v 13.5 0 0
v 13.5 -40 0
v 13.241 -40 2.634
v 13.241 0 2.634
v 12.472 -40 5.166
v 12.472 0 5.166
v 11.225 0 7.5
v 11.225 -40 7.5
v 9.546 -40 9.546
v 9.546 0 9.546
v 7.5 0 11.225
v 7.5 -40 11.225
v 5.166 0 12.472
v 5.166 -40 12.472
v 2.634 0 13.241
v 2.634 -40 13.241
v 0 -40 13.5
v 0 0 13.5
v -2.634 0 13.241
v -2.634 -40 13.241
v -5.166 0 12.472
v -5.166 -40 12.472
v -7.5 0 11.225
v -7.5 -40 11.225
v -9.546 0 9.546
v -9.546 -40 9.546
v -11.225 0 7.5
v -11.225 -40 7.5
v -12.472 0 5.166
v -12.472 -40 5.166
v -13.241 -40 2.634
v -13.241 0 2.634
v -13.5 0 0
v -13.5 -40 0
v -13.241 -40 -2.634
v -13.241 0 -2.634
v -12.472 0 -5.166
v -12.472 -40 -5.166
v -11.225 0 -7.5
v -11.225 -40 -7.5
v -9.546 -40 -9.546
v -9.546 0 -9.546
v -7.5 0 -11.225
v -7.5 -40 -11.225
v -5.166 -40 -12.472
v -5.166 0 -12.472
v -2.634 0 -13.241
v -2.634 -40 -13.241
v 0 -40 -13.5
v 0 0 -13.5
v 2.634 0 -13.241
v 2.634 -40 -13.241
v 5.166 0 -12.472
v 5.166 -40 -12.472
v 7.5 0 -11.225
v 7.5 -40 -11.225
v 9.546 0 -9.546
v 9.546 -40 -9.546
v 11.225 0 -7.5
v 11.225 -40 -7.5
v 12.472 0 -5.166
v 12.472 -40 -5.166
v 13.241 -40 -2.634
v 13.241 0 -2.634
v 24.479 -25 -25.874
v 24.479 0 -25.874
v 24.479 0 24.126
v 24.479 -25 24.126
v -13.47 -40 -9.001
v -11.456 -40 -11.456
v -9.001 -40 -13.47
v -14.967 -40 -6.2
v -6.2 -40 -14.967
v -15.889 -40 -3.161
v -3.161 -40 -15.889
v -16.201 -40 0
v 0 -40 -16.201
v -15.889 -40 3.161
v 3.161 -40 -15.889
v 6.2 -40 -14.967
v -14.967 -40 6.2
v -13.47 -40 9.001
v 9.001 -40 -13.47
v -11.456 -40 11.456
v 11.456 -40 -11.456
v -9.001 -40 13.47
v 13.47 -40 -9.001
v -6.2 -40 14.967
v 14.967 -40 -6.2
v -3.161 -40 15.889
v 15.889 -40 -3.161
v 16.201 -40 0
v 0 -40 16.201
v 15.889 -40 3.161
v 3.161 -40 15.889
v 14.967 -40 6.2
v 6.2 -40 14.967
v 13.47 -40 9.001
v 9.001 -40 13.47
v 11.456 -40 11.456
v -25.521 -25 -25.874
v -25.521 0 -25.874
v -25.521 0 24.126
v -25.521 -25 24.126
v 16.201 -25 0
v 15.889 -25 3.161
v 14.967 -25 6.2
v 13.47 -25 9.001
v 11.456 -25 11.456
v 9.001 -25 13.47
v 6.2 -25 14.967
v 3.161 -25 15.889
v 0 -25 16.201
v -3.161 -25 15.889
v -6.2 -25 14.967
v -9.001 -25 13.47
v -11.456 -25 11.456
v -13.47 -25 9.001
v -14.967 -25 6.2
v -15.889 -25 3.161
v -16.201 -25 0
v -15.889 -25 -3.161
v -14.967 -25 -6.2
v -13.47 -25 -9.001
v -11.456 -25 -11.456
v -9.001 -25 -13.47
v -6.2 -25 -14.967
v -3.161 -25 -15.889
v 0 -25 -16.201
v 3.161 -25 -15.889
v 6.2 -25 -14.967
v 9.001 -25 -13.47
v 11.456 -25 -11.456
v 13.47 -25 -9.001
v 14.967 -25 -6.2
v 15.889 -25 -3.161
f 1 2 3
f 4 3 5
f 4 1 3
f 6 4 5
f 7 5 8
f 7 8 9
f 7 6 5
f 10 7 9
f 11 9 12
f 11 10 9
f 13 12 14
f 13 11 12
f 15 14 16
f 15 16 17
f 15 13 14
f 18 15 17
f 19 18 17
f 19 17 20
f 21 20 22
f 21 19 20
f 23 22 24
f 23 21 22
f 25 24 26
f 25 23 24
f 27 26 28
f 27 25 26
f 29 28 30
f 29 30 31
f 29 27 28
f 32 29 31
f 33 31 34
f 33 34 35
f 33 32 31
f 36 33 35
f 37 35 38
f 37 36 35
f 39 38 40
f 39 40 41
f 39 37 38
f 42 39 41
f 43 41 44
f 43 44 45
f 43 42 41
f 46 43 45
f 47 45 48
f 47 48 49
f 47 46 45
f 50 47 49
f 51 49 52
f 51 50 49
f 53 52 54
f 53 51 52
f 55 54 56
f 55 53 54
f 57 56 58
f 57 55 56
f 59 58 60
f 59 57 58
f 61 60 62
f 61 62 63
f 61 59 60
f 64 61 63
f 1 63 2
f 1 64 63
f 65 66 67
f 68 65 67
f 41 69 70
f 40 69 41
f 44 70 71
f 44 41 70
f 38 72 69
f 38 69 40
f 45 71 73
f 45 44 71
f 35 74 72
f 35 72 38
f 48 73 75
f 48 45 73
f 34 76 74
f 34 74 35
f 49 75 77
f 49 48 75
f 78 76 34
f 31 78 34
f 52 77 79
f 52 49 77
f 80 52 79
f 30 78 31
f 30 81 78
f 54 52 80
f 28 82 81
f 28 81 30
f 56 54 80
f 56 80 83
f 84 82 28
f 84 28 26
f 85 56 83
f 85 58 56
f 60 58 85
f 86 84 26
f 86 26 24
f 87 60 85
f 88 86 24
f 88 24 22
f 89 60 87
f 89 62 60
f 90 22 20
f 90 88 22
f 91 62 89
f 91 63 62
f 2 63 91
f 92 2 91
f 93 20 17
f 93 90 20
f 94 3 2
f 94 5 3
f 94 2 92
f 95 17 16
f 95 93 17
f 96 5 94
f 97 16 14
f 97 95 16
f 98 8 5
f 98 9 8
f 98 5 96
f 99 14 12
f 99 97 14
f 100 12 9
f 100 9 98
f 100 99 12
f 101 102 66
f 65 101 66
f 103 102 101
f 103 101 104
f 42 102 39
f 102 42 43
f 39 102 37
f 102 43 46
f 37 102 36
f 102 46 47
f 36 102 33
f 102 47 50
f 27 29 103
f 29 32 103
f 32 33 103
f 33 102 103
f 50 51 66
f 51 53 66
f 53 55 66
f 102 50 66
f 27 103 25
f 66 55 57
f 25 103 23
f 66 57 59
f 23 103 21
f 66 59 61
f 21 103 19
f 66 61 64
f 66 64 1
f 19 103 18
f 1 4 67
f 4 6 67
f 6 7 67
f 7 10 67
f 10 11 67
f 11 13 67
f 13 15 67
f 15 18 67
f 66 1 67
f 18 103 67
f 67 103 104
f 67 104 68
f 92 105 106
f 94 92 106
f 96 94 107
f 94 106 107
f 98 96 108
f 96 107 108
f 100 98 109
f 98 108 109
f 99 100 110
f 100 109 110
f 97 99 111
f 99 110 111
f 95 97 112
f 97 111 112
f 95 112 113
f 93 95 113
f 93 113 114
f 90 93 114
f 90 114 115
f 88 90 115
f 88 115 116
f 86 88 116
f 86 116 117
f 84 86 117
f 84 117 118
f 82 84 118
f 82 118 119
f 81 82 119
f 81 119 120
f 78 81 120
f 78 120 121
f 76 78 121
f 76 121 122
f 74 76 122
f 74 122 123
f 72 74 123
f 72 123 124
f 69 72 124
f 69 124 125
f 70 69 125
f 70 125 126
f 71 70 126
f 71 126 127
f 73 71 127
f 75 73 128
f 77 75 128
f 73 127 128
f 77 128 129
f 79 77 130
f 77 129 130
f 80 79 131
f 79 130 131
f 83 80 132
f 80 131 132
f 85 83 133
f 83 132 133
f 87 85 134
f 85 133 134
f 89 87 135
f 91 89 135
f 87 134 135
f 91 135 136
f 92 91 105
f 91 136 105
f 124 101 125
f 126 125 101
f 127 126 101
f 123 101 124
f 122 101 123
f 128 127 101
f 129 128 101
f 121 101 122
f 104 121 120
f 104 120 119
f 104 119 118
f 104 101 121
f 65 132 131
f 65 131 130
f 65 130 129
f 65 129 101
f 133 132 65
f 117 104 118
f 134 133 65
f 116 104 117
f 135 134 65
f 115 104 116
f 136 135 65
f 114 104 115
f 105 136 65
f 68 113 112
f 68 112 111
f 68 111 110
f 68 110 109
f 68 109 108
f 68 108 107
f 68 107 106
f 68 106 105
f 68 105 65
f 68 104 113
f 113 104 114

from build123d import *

# Parameters (mm, degrees)
F0_W     = 50
F0_H     = 50
F1_DEPTH = 25
F2_R     = 16.200601
F3_DEPTH = 40
F4_R     = 13.5
F5_DEPTH = 40


with BuildPart() as f1:
    # F0 (on Front) → F1 (new body)
    with BuildSketch(Plane.XZ):
        with Locations((-0.520919, -0.873815)):
            Rectangle(F0_W, F0_H)
    extrude(amount=F1_DEPTH)

    # F2 (on Front) → F3 (join)
    with BuildSketch(Plane.XZ):
        Circle(F2_R)
    extrude(amount=F3_DEPTH)

    # F4 (on Front) → F5 (cut)
    with BuildSketch(Plane.XZ):
        Circle(F4_R)
    extrude(amount=F5_DEPTH, mode=Mode.SUBTRACT)


solid = f1.part
